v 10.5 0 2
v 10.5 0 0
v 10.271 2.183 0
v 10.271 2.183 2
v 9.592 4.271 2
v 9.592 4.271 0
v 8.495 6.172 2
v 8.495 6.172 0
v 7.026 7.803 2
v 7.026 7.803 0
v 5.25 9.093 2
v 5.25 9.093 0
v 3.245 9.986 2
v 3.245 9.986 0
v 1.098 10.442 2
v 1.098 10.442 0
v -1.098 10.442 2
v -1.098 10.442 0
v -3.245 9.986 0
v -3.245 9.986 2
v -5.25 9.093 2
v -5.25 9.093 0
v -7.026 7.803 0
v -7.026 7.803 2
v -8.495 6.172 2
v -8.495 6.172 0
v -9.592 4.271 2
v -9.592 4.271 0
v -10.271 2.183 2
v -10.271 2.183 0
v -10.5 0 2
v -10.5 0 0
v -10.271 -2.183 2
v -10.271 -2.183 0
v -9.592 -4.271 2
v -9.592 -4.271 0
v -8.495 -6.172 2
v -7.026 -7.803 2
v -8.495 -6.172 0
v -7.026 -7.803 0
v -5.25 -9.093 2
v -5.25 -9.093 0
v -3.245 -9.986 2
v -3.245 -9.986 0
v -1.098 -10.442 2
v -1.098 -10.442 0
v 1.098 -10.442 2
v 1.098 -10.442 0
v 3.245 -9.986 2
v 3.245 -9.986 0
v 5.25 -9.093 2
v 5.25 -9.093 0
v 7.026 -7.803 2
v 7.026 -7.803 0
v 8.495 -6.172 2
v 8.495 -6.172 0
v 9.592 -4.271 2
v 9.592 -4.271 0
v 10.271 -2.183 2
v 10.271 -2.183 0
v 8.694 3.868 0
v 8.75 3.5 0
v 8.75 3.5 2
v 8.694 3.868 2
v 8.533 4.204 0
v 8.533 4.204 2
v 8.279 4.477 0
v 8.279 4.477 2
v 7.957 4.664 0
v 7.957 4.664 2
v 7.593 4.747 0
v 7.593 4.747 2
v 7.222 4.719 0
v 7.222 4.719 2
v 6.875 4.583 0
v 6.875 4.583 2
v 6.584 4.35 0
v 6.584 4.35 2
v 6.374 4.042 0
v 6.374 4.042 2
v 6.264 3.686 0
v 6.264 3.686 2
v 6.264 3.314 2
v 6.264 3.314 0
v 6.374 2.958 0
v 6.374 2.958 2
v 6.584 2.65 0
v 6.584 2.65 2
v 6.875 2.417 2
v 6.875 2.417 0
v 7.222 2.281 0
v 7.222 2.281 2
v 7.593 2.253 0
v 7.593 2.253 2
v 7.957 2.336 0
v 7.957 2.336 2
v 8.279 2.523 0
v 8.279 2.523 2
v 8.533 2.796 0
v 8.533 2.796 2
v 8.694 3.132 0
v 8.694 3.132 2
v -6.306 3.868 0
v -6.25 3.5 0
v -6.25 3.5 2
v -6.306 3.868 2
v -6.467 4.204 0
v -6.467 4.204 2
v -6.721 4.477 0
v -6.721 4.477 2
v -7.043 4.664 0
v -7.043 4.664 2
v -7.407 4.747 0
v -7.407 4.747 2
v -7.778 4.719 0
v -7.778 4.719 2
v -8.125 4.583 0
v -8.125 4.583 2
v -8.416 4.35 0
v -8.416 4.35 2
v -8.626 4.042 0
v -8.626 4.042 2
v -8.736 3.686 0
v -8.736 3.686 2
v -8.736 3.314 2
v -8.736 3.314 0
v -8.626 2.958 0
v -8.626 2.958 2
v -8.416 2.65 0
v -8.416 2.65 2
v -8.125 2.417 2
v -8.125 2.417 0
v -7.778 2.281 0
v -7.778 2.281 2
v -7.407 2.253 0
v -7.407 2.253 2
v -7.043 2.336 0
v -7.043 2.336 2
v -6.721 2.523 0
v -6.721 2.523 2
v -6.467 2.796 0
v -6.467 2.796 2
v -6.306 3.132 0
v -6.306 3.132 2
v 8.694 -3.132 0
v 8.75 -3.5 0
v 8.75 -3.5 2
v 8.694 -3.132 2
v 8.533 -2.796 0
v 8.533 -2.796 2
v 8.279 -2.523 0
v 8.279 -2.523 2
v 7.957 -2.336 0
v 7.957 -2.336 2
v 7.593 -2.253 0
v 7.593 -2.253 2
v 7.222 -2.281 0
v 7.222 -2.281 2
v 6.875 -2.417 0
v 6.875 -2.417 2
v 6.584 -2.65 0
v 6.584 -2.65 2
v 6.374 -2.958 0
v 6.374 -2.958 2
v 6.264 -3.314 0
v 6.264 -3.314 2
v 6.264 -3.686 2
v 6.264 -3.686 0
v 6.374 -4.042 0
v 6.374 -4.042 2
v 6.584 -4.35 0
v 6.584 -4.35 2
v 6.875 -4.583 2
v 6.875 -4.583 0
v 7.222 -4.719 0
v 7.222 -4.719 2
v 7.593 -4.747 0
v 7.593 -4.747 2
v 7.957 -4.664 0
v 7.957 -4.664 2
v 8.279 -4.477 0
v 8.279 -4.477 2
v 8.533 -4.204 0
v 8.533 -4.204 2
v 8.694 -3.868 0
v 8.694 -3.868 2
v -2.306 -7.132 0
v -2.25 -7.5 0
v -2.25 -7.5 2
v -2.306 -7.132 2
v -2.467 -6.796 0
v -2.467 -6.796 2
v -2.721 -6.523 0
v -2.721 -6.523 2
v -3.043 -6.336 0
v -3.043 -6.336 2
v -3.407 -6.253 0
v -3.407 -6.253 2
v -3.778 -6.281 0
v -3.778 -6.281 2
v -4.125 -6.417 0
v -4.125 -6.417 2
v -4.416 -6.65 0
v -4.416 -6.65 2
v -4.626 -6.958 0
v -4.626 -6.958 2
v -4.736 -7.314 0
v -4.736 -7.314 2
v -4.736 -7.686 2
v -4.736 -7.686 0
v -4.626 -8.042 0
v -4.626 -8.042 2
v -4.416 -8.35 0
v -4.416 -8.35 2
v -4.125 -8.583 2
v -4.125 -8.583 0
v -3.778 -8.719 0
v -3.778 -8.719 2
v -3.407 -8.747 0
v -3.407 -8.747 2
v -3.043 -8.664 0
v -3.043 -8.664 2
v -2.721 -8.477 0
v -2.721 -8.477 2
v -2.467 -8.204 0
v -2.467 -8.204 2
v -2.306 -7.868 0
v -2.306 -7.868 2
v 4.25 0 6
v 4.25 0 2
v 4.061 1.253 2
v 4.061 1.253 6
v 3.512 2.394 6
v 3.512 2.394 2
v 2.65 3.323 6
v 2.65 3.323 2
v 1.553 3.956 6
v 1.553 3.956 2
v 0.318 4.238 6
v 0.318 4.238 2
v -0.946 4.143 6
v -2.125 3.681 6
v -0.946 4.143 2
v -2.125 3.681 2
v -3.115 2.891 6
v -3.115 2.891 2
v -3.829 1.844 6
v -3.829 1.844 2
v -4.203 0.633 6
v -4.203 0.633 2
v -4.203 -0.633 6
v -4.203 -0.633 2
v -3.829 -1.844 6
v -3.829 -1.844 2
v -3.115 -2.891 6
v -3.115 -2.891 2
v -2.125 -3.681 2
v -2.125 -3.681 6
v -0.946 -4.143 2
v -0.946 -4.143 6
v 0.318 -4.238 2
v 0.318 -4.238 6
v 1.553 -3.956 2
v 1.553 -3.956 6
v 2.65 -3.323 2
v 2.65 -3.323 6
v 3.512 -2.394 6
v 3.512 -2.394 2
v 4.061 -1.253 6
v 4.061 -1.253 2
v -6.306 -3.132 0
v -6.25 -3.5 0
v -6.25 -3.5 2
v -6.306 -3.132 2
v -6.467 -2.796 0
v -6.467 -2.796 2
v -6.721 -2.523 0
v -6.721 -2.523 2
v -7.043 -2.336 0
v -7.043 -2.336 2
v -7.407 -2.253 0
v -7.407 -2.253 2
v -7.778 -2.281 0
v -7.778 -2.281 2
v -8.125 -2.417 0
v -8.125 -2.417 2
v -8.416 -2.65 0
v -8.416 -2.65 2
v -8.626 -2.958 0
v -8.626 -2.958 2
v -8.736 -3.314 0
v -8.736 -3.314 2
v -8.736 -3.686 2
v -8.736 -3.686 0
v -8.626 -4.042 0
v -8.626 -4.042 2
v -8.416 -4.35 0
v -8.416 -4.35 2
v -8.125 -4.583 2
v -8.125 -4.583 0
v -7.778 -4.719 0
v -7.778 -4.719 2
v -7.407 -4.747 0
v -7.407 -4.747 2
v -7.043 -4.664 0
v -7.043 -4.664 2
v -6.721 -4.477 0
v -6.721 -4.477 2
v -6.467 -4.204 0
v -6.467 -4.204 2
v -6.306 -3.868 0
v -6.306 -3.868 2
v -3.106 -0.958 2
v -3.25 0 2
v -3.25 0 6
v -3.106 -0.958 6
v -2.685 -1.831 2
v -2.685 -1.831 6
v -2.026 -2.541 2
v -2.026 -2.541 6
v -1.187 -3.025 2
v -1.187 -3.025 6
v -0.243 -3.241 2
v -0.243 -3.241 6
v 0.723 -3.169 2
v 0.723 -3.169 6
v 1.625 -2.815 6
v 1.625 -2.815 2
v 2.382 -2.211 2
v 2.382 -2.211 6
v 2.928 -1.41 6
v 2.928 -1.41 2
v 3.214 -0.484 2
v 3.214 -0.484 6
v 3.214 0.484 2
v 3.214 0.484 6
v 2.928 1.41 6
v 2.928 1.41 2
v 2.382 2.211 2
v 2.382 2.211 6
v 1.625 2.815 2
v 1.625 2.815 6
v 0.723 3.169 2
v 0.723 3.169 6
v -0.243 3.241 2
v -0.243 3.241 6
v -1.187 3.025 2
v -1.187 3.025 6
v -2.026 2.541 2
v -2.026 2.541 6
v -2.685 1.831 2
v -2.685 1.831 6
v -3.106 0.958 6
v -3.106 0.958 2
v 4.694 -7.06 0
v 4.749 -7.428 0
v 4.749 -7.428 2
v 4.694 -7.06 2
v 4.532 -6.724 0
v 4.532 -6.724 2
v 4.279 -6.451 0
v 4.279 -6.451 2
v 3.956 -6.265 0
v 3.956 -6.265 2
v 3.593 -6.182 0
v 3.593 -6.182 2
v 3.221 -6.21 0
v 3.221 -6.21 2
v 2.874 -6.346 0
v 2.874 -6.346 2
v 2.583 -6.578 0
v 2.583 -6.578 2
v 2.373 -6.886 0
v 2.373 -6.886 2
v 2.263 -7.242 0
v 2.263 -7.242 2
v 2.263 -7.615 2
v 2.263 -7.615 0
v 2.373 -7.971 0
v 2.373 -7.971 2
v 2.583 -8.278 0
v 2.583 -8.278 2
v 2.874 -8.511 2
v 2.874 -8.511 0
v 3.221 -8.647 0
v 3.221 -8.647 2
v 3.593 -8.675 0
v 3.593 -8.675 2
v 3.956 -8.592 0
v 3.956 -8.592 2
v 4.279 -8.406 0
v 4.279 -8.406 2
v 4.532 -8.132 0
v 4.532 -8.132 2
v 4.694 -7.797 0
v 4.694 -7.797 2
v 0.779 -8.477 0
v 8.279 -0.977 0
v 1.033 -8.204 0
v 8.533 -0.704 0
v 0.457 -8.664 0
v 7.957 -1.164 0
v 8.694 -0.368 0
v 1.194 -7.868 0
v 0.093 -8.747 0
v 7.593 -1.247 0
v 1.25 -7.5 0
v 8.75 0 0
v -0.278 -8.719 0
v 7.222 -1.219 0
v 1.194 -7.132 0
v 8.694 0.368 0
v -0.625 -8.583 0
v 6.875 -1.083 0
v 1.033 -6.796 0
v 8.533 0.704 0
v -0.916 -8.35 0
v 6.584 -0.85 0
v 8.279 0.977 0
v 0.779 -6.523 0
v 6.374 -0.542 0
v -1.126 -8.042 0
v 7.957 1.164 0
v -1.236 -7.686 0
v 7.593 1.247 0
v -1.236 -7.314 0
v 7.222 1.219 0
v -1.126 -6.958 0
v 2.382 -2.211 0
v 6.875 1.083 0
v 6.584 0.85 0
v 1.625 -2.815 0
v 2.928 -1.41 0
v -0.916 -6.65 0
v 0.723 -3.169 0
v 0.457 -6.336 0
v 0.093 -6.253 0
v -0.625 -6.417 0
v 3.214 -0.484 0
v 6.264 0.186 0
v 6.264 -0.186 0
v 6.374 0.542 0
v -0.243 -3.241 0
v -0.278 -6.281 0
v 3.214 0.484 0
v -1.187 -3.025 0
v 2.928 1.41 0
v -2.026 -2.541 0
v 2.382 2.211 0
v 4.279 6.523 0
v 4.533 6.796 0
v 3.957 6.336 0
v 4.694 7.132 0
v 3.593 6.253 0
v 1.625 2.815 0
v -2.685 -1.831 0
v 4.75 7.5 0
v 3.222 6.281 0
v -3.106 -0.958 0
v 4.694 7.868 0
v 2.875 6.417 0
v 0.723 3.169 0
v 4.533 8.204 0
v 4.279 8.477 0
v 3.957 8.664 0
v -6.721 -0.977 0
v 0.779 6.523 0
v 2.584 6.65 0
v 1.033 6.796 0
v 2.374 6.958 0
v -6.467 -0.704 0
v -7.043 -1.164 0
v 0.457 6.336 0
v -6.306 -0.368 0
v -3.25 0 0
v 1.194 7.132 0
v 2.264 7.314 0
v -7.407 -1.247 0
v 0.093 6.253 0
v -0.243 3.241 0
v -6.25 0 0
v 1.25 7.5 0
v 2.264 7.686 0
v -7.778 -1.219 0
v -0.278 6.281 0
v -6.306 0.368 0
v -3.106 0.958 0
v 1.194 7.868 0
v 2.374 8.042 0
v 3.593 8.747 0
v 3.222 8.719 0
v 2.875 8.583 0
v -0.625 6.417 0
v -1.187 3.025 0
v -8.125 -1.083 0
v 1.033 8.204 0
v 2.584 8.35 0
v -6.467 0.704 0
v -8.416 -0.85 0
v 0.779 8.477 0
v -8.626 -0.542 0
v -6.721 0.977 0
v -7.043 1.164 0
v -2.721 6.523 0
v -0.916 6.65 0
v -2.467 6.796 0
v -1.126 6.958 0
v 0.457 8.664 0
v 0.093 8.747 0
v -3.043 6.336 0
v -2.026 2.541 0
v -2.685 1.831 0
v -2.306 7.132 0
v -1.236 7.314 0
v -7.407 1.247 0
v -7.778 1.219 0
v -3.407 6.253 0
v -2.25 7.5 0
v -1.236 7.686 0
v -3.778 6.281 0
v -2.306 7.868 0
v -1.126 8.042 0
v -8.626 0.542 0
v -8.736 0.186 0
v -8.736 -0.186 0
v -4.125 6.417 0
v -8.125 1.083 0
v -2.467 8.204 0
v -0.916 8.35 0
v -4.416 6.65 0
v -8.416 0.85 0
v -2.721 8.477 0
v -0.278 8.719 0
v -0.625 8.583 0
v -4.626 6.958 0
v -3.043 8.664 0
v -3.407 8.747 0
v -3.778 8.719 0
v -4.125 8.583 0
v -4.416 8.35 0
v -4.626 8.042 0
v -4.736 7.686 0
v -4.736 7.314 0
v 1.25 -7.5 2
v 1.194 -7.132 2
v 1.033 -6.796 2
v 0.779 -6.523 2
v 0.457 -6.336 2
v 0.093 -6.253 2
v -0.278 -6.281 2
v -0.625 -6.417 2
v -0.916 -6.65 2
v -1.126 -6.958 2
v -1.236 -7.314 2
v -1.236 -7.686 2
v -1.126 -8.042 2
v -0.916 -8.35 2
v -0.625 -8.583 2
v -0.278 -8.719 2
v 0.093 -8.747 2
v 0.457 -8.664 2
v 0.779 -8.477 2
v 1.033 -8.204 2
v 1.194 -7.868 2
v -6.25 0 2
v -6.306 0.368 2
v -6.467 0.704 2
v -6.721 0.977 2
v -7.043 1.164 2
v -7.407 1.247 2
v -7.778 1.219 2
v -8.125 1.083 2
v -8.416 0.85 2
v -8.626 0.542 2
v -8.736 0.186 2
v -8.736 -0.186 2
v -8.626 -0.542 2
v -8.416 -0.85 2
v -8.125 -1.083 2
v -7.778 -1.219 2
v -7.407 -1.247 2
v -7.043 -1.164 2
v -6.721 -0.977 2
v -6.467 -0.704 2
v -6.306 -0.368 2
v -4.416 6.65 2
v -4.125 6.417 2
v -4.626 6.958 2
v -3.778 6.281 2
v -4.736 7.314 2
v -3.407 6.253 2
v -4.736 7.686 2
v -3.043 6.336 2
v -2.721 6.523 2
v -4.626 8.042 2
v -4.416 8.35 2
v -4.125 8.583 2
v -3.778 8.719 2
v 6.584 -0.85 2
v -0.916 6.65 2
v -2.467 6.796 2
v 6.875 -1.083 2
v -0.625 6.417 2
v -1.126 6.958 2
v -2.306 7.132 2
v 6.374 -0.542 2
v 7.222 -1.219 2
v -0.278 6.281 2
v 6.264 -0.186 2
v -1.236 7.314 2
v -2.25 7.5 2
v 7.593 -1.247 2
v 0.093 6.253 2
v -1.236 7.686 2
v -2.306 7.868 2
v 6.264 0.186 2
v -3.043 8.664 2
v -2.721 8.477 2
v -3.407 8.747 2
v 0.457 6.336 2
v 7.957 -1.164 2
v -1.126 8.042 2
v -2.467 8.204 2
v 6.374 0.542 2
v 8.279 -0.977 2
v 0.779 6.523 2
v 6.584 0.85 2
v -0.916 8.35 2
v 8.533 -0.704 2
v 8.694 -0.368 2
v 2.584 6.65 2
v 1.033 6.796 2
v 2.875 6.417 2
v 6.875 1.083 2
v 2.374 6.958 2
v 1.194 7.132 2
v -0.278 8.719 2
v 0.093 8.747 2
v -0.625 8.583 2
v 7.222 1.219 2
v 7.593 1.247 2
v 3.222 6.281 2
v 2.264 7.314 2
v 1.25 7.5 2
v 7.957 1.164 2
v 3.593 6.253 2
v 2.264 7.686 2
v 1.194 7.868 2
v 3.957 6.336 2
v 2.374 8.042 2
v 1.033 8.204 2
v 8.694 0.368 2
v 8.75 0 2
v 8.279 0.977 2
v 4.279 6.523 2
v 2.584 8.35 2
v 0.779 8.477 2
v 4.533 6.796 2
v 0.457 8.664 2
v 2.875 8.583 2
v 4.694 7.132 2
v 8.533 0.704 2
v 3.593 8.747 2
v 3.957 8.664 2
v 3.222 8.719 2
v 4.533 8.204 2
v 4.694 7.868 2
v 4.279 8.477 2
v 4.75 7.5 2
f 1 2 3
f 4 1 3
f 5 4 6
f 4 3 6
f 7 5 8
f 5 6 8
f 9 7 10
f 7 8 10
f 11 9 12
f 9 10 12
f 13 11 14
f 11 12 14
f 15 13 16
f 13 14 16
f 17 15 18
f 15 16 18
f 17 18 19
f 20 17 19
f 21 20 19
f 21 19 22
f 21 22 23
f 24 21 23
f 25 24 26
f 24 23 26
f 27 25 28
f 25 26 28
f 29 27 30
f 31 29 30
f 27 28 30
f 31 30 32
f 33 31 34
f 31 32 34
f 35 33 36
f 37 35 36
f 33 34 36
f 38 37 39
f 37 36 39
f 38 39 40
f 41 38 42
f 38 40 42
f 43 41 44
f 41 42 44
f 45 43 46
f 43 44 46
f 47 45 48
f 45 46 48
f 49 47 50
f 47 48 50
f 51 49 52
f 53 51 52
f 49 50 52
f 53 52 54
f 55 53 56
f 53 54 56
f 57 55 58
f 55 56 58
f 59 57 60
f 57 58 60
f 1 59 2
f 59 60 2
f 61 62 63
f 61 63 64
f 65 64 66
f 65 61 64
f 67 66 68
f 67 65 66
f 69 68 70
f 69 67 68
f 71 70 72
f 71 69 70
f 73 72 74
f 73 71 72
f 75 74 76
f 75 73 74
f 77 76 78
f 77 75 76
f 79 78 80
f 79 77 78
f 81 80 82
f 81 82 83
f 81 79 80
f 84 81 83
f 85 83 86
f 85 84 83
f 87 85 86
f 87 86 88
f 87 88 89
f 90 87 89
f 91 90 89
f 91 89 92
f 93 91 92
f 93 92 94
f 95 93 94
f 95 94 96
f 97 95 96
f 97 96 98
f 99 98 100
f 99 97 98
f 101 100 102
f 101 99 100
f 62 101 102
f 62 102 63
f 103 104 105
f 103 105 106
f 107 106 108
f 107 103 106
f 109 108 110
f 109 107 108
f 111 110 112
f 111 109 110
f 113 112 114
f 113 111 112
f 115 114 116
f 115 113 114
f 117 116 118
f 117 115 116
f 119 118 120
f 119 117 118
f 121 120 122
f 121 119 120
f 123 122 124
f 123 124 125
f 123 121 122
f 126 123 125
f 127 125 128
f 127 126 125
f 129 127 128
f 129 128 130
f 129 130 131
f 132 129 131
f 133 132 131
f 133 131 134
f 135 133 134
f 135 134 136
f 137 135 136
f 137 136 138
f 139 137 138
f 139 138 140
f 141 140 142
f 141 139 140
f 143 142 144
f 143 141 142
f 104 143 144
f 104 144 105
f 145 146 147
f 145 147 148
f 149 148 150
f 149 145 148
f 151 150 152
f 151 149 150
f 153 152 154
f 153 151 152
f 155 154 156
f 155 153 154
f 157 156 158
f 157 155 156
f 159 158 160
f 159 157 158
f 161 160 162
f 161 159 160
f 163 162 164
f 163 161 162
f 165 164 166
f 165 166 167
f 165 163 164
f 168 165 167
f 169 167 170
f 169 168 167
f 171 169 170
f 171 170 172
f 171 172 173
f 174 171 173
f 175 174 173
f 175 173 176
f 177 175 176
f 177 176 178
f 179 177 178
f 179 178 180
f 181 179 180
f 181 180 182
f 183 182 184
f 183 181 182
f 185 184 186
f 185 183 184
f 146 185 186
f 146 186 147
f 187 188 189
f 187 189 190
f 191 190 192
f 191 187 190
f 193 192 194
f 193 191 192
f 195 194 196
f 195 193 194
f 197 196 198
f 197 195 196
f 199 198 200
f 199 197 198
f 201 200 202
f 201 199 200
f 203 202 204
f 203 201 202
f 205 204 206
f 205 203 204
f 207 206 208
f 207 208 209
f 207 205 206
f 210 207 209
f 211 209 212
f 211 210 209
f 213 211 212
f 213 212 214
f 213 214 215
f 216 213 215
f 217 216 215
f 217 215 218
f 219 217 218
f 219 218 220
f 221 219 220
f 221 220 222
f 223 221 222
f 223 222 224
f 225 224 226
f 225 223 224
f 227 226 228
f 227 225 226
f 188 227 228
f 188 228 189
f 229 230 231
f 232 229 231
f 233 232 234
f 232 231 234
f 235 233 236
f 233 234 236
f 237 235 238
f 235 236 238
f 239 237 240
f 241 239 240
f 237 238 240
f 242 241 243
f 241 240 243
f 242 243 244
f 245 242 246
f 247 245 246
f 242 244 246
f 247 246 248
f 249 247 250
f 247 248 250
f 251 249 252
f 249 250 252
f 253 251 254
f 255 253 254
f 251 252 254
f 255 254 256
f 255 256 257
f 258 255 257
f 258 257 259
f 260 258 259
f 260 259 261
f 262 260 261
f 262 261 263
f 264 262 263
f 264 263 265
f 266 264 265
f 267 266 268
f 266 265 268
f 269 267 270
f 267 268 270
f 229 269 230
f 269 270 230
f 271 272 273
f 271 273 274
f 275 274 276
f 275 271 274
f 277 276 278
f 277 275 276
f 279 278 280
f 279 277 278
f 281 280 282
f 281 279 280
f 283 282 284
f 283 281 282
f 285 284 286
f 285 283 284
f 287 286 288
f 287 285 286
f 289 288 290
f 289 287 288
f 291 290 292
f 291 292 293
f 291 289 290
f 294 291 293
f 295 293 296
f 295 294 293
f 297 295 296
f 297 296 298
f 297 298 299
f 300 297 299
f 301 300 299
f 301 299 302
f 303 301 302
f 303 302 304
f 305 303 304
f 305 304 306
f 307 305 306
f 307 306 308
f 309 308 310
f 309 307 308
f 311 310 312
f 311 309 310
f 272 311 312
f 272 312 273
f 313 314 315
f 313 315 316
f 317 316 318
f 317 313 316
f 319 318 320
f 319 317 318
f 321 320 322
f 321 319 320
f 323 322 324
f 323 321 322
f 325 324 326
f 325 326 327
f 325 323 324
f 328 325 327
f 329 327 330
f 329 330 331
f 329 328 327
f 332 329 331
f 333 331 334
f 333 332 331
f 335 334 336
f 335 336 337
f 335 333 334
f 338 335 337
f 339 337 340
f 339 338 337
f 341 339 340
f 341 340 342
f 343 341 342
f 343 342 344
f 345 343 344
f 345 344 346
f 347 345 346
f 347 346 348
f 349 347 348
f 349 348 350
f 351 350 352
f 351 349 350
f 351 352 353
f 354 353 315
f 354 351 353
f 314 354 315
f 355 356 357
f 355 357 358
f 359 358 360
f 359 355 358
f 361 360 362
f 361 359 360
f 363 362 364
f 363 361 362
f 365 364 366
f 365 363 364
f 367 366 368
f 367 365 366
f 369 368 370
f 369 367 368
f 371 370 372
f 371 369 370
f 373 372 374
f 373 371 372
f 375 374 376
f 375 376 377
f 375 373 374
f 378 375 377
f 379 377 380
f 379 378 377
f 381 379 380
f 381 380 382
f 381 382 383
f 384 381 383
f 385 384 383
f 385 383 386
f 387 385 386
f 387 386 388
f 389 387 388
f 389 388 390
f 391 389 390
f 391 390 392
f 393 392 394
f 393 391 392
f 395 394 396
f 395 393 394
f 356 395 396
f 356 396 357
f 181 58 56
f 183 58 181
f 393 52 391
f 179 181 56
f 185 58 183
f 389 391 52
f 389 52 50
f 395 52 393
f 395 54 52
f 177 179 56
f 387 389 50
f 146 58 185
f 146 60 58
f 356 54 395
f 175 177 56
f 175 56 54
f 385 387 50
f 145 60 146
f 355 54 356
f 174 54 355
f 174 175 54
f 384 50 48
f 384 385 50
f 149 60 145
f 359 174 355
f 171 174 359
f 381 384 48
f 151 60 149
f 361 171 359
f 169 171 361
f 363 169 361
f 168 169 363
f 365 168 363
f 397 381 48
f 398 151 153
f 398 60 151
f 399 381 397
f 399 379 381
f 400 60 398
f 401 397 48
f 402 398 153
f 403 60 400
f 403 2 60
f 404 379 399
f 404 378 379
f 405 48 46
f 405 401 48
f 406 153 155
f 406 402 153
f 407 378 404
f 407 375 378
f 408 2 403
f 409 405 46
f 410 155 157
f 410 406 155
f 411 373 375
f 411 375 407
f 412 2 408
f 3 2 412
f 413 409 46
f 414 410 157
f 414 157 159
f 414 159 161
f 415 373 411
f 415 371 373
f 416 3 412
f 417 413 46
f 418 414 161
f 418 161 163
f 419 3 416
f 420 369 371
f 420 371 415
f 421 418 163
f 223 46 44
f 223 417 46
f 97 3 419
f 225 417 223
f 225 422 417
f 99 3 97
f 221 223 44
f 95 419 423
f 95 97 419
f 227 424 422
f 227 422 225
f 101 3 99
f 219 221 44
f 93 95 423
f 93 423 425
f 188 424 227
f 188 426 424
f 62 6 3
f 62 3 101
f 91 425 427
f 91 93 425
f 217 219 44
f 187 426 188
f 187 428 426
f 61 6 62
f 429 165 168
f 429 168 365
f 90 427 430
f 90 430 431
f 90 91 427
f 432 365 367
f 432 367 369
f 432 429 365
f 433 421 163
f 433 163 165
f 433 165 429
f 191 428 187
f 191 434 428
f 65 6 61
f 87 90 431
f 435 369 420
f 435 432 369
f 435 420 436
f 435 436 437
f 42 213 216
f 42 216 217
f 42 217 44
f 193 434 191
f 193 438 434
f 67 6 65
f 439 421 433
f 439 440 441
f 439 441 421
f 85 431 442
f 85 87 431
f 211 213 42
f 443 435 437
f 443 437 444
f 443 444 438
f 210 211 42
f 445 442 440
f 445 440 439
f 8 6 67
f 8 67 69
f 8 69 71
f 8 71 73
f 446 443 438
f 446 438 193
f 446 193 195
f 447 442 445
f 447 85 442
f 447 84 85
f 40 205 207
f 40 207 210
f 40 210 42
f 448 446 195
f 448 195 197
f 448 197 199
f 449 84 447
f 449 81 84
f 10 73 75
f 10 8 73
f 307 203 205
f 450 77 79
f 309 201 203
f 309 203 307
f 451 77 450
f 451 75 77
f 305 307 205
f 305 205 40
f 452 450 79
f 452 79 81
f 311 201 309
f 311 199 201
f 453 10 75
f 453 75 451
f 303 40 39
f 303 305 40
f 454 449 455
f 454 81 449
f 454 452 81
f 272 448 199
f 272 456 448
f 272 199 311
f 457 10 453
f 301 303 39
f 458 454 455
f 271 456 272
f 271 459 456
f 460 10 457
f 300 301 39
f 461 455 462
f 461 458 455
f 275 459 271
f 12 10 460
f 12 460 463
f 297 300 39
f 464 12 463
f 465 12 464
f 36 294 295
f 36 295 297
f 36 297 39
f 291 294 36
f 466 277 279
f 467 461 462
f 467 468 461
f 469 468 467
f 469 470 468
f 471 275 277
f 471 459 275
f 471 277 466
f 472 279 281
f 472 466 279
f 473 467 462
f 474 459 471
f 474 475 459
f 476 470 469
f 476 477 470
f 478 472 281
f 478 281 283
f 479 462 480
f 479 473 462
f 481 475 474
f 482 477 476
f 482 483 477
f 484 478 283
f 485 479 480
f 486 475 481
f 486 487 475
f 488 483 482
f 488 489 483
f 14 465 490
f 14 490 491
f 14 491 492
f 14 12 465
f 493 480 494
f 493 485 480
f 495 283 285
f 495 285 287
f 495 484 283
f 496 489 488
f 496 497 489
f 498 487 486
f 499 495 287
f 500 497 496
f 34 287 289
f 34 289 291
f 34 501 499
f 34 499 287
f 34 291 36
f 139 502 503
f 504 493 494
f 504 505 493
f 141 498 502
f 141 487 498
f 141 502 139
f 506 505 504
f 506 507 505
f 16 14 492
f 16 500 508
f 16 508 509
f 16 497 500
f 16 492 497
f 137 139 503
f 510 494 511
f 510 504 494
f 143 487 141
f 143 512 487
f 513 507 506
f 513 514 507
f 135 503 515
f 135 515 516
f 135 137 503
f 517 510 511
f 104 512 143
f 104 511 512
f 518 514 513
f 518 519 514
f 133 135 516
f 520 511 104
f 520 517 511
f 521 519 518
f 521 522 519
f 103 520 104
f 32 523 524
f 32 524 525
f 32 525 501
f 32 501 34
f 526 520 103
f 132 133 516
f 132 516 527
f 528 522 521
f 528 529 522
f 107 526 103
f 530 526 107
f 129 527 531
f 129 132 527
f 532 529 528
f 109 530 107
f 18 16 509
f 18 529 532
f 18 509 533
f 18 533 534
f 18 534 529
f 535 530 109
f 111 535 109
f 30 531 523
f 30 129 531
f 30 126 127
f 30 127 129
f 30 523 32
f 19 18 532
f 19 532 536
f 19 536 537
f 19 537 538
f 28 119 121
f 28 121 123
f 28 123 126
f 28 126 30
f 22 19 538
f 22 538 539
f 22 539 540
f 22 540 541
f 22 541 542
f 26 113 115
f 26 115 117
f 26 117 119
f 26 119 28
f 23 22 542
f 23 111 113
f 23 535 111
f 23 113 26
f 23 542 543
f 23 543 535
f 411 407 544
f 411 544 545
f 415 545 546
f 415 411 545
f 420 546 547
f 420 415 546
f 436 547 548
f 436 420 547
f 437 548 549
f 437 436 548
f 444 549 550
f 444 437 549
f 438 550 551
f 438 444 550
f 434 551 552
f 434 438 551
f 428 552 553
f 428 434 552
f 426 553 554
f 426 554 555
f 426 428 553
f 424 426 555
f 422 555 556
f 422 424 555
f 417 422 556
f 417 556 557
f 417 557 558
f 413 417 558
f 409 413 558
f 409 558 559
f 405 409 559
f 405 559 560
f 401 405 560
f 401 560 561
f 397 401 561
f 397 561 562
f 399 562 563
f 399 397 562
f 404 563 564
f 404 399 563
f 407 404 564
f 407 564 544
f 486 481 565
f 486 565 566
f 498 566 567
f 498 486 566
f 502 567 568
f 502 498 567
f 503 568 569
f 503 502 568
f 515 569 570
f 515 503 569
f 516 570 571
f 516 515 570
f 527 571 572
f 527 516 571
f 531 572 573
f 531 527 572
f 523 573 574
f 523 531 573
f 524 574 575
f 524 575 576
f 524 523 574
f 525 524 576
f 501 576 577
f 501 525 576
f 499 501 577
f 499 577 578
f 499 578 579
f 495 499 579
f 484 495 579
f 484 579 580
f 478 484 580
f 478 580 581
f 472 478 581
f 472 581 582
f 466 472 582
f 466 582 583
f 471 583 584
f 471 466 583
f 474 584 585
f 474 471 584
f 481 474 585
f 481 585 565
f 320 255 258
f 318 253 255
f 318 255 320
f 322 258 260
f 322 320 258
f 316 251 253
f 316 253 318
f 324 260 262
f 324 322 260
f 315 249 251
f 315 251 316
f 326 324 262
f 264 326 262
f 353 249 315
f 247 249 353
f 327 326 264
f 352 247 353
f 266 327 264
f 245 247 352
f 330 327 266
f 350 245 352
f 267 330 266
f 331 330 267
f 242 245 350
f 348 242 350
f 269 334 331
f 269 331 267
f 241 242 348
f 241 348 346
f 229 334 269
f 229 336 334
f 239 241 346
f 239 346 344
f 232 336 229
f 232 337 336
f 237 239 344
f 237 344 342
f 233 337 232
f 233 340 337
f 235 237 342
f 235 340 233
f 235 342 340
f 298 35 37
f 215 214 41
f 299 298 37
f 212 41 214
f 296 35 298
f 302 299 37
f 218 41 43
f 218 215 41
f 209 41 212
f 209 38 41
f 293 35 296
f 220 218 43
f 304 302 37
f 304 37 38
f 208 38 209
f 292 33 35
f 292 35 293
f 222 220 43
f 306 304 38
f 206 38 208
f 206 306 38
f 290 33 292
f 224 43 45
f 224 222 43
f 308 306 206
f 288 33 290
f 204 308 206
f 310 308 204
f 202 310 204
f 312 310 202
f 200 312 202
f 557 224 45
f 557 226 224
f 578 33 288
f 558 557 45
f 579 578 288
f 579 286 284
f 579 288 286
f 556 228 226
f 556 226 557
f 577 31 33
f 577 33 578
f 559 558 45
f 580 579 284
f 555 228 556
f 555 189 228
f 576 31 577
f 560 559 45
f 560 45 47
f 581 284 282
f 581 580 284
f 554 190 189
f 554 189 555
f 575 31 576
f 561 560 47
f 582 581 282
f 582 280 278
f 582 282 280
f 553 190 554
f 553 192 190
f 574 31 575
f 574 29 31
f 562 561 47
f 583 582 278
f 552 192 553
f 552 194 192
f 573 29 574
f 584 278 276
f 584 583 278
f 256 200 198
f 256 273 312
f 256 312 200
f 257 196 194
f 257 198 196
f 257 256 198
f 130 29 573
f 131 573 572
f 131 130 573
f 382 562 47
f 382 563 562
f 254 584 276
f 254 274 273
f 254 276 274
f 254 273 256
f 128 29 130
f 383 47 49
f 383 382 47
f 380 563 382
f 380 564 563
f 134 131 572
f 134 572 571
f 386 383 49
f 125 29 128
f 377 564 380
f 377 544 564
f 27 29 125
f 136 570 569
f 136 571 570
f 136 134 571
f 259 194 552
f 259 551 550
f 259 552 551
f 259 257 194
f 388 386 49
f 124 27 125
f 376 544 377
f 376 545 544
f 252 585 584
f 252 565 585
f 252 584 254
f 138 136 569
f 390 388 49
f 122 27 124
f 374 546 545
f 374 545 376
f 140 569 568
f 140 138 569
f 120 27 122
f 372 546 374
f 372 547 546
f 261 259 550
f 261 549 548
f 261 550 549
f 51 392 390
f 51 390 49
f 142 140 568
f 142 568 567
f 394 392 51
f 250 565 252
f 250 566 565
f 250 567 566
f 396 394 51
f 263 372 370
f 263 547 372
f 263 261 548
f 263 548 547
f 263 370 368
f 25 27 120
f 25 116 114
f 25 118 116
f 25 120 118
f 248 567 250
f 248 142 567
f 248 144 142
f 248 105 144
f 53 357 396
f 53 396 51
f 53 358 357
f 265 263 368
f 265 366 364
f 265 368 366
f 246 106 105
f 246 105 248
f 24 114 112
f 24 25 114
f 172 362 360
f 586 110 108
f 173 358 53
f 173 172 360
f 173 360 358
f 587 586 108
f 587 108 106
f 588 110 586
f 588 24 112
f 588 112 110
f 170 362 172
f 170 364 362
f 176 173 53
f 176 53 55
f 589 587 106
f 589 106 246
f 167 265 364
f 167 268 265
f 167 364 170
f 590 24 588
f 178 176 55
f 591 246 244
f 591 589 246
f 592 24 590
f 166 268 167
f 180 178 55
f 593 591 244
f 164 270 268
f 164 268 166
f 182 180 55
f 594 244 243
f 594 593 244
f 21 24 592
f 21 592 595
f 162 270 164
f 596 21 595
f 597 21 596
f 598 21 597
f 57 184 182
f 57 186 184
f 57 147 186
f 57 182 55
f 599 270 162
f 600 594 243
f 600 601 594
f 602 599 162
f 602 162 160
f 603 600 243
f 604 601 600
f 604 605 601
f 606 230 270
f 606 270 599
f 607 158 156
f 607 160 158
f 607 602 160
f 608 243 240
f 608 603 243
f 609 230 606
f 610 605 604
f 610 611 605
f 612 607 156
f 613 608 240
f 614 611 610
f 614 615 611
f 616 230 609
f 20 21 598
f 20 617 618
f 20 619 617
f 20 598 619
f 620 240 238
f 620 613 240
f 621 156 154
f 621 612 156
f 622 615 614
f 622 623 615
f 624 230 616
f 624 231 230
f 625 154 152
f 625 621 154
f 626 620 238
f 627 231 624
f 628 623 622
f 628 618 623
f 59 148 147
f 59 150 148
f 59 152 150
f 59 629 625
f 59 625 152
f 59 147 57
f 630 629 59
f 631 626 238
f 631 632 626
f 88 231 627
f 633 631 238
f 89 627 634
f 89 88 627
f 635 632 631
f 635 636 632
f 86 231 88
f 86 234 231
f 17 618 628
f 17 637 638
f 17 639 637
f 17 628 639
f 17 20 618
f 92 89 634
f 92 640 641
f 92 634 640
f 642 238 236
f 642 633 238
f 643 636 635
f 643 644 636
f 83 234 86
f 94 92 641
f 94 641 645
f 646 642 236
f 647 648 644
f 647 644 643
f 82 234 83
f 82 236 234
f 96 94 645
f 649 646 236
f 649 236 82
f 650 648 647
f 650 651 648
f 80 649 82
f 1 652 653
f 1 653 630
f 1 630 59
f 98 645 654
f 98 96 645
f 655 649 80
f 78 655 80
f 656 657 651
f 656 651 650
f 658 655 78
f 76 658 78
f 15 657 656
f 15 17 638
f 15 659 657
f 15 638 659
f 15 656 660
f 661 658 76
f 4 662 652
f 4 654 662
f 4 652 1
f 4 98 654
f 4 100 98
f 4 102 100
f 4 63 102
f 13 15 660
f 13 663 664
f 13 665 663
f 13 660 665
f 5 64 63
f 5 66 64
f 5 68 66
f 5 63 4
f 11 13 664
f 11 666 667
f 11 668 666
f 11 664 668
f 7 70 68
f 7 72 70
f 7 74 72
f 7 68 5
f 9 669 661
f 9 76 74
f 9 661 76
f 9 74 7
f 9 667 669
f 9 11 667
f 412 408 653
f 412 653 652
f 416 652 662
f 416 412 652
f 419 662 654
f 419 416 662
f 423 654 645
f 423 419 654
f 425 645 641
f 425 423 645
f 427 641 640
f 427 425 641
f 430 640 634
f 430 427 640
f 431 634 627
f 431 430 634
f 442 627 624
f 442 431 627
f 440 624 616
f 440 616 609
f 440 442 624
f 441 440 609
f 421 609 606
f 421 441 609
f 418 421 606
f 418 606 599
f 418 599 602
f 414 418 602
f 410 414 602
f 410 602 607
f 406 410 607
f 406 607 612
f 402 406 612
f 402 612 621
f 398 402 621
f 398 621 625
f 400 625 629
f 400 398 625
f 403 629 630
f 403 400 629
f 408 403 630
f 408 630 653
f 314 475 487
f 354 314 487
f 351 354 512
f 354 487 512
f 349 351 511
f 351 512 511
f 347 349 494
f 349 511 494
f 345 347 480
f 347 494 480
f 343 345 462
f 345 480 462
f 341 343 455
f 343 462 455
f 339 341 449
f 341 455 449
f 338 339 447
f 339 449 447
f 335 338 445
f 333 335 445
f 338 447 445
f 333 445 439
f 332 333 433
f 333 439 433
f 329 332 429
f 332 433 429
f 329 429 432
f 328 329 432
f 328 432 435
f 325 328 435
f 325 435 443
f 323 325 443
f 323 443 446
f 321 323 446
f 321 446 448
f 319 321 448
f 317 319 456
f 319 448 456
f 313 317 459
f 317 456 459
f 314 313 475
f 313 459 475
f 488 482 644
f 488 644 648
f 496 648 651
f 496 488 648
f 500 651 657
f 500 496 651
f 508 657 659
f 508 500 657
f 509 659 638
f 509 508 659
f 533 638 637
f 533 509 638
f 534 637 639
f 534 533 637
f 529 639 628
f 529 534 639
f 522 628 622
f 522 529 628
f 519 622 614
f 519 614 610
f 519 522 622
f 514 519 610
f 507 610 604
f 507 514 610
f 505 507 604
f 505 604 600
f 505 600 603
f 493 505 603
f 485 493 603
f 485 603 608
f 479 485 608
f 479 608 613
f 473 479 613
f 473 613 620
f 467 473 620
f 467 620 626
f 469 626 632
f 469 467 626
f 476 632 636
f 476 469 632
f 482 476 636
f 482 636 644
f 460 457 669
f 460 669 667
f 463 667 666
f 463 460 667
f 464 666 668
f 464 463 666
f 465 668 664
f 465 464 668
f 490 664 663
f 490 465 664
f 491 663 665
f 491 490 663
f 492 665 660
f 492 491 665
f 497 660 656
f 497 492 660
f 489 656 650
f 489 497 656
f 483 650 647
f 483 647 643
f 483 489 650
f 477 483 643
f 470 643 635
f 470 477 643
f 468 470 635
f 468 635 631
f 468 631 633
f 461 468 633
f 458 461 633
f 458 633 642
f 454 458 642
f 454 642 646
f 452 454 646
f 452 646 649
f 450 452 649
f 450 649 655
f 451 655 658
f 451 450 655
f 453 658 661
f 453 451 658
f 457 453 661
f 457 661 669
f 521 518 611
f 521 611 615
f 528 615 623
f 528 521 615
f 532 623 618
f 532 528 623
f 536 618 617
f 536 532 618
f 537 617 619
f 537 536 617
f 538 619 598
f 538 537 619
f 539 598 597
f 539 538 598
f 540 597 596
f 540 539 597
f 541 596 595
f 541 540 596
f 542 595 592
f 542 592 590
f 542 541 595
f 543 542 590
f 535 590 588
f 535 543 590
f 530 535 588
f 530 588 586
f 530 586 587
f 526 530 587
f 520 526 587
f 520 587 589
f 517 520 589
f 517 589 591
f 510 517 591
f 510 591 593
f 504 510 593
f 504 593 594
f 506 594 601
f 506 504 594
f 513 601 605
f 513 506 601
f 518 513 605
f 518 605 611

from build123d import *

# Parameters (mm, degrees)
SKETCH5_R           = 10.5
SKETCH5_R_2         = 1.25
BOSS_EXTRUDE2_DEPTH = 2
SKETCH6_R           = 1.25
CUT_EXTRUDE2_DEPTH  = 2
SKETCH7_R           = 3
CUT_EXTRUDE3_DEPTH  = 1
SKETCH9_R           = 3
CUT_EXTRUDE5_DEPTH  = 5
SKETCH10_R          = 3
BOSS_EXTRUDE5_DEPTH = 2
SKETCH11_R          = 3.25
CUT_EXTRUDE6_DEPTH  = 2
SKETCH13_R          = 4.25
SKETCH13_R_2        = 3.25
BOSS_EXTRUDE6_DEPTH = 4


with BuildPart() as part:
    # Sketch5 → Boss-Extrude2 (new body)
    with BuildSketch(Plane.XY):
        Circle(SKETCH5_R)
        with Locations((0, 7.5)):
            Circle(SKETCH5_R_2, mode=Mode.SUBTRACT)
        with Locations((-3.5, 7.5)):
            Circle(SKETCH5_R_2, mode=Mode.SUBTRACT)
        with Locations((3.5, 7.5)):
            Circle(SKETCH5_R_2, mode=Mode.SUBTRACT)
        with Locations((-7.5, 0)):
            Circle(SKETCH5_R_2, mode=Mode.SUBTRACT)
        with Locations((-7.5, 3.5)):
            Circle(SKETCH5_R_2, mode=Mode.SUBTRACT)
        with Locations((-7.5, -3.5)):
            Circle(SKETCH5_R_2, mode=Mode.SUBTRACT)
        with Locations((0, -7.5)):
            Circle(SKETCH5_R_2, mode=Mode.SUBTRACT)
        with Locations((-3.5, -7.5)):
            Circle(SKETCH5_R_2, mode=Mode.SUBTRACT)
        with Locations((3.499264905, -7.428270452)):
            Circle(SKETCH5_R_2, mode=Mode.SUBTRACT)
        with Locations((7.5, 0)):
            Circle(SKETCH5_R_2, mode=Mode.SUBTRACT)
        with Locations((7.5, 3.5)):
            Circle(SKETCH5_R_2, mode=Mode.SUBTRACT)
        with Locations((7.5, -3.5)):
            Circle(SKETCH5_R_2, mode=Mode.SUBTRACT)
    extrude(amount=BOSS_EXTRUDE2_DEPTH)

    # Sketch6 → Cut-Extrude2 (cut)
    with BuildSketch(Plane(origin=(0, 0, 0), x_dir=(-1, 0, 0), z_dir=(0, 0, -1))):
        Circle(SKETCH6_R)
    extrude(amount=-CUT_EXTRUDE2_DEPTH, mode=Mode.SUBTRACT)

    # Sketch7 → Cut-Extrude3 (cut)
    with BuildSketch(Plane(origin=(0, 0, 0), x_dir=(-1, 0, 0), z_dir=(0, 0, -1))):
        Circle(SKETCH7_R)
    extrude(amount=-CUT_EXTRUDE3_DEPTH, mode=Mode.SUBTRACT)

    # Sketch9 → Cut-Extrude5 (cut)
    with BuildSketch(Plane(origin=(0, 0, 0), x_dir=(-1, 0, 0), z_dir=(0, 0, -1))):
        Circle(SKETCH9_R)
    extrude(amount=-CUT_EXTRUDE5_DEPTH, mode=Mode.SUBTRACT)

    # Sketch10 → Boss-Extrude5 (add)
    with BuildSketch(Plane(origin=(0, 0, 0), x_dir=(-1, 0, 0), z_dir=(0, 0, -1))):
        Circle(SKETCH10_R)
    extrude(amount=-BOSS_EXTRUDE5_DEPTH)

    # Sketch11 → Cut-Extrude6 (cut)
    with BuildSketch(Plane(origin=(0, 0, 0), x_dir=(-1, 0, 0), z_dir=(0, 0, -1))):
        Circle(SKETCH11_R)
    extrude(amount=-CUT_EXTRUDE6_DEPTH, mode=Mode.SUBTRACT)

    # Sketch13 → Boss-Extrude6 (add)
    with BuildSketch(Plane.XY.offset(2)):
        Circle(SKETCH13_R)
        with Locations(Location((0, 0, 0), (0, 0, 180))):
            Circle(SKETCH13_R_2, mode=Mode.SUBTRACT)
    extrude(amount=BOSS_EXTRUDE6_DEPTH)


solid = part.part
